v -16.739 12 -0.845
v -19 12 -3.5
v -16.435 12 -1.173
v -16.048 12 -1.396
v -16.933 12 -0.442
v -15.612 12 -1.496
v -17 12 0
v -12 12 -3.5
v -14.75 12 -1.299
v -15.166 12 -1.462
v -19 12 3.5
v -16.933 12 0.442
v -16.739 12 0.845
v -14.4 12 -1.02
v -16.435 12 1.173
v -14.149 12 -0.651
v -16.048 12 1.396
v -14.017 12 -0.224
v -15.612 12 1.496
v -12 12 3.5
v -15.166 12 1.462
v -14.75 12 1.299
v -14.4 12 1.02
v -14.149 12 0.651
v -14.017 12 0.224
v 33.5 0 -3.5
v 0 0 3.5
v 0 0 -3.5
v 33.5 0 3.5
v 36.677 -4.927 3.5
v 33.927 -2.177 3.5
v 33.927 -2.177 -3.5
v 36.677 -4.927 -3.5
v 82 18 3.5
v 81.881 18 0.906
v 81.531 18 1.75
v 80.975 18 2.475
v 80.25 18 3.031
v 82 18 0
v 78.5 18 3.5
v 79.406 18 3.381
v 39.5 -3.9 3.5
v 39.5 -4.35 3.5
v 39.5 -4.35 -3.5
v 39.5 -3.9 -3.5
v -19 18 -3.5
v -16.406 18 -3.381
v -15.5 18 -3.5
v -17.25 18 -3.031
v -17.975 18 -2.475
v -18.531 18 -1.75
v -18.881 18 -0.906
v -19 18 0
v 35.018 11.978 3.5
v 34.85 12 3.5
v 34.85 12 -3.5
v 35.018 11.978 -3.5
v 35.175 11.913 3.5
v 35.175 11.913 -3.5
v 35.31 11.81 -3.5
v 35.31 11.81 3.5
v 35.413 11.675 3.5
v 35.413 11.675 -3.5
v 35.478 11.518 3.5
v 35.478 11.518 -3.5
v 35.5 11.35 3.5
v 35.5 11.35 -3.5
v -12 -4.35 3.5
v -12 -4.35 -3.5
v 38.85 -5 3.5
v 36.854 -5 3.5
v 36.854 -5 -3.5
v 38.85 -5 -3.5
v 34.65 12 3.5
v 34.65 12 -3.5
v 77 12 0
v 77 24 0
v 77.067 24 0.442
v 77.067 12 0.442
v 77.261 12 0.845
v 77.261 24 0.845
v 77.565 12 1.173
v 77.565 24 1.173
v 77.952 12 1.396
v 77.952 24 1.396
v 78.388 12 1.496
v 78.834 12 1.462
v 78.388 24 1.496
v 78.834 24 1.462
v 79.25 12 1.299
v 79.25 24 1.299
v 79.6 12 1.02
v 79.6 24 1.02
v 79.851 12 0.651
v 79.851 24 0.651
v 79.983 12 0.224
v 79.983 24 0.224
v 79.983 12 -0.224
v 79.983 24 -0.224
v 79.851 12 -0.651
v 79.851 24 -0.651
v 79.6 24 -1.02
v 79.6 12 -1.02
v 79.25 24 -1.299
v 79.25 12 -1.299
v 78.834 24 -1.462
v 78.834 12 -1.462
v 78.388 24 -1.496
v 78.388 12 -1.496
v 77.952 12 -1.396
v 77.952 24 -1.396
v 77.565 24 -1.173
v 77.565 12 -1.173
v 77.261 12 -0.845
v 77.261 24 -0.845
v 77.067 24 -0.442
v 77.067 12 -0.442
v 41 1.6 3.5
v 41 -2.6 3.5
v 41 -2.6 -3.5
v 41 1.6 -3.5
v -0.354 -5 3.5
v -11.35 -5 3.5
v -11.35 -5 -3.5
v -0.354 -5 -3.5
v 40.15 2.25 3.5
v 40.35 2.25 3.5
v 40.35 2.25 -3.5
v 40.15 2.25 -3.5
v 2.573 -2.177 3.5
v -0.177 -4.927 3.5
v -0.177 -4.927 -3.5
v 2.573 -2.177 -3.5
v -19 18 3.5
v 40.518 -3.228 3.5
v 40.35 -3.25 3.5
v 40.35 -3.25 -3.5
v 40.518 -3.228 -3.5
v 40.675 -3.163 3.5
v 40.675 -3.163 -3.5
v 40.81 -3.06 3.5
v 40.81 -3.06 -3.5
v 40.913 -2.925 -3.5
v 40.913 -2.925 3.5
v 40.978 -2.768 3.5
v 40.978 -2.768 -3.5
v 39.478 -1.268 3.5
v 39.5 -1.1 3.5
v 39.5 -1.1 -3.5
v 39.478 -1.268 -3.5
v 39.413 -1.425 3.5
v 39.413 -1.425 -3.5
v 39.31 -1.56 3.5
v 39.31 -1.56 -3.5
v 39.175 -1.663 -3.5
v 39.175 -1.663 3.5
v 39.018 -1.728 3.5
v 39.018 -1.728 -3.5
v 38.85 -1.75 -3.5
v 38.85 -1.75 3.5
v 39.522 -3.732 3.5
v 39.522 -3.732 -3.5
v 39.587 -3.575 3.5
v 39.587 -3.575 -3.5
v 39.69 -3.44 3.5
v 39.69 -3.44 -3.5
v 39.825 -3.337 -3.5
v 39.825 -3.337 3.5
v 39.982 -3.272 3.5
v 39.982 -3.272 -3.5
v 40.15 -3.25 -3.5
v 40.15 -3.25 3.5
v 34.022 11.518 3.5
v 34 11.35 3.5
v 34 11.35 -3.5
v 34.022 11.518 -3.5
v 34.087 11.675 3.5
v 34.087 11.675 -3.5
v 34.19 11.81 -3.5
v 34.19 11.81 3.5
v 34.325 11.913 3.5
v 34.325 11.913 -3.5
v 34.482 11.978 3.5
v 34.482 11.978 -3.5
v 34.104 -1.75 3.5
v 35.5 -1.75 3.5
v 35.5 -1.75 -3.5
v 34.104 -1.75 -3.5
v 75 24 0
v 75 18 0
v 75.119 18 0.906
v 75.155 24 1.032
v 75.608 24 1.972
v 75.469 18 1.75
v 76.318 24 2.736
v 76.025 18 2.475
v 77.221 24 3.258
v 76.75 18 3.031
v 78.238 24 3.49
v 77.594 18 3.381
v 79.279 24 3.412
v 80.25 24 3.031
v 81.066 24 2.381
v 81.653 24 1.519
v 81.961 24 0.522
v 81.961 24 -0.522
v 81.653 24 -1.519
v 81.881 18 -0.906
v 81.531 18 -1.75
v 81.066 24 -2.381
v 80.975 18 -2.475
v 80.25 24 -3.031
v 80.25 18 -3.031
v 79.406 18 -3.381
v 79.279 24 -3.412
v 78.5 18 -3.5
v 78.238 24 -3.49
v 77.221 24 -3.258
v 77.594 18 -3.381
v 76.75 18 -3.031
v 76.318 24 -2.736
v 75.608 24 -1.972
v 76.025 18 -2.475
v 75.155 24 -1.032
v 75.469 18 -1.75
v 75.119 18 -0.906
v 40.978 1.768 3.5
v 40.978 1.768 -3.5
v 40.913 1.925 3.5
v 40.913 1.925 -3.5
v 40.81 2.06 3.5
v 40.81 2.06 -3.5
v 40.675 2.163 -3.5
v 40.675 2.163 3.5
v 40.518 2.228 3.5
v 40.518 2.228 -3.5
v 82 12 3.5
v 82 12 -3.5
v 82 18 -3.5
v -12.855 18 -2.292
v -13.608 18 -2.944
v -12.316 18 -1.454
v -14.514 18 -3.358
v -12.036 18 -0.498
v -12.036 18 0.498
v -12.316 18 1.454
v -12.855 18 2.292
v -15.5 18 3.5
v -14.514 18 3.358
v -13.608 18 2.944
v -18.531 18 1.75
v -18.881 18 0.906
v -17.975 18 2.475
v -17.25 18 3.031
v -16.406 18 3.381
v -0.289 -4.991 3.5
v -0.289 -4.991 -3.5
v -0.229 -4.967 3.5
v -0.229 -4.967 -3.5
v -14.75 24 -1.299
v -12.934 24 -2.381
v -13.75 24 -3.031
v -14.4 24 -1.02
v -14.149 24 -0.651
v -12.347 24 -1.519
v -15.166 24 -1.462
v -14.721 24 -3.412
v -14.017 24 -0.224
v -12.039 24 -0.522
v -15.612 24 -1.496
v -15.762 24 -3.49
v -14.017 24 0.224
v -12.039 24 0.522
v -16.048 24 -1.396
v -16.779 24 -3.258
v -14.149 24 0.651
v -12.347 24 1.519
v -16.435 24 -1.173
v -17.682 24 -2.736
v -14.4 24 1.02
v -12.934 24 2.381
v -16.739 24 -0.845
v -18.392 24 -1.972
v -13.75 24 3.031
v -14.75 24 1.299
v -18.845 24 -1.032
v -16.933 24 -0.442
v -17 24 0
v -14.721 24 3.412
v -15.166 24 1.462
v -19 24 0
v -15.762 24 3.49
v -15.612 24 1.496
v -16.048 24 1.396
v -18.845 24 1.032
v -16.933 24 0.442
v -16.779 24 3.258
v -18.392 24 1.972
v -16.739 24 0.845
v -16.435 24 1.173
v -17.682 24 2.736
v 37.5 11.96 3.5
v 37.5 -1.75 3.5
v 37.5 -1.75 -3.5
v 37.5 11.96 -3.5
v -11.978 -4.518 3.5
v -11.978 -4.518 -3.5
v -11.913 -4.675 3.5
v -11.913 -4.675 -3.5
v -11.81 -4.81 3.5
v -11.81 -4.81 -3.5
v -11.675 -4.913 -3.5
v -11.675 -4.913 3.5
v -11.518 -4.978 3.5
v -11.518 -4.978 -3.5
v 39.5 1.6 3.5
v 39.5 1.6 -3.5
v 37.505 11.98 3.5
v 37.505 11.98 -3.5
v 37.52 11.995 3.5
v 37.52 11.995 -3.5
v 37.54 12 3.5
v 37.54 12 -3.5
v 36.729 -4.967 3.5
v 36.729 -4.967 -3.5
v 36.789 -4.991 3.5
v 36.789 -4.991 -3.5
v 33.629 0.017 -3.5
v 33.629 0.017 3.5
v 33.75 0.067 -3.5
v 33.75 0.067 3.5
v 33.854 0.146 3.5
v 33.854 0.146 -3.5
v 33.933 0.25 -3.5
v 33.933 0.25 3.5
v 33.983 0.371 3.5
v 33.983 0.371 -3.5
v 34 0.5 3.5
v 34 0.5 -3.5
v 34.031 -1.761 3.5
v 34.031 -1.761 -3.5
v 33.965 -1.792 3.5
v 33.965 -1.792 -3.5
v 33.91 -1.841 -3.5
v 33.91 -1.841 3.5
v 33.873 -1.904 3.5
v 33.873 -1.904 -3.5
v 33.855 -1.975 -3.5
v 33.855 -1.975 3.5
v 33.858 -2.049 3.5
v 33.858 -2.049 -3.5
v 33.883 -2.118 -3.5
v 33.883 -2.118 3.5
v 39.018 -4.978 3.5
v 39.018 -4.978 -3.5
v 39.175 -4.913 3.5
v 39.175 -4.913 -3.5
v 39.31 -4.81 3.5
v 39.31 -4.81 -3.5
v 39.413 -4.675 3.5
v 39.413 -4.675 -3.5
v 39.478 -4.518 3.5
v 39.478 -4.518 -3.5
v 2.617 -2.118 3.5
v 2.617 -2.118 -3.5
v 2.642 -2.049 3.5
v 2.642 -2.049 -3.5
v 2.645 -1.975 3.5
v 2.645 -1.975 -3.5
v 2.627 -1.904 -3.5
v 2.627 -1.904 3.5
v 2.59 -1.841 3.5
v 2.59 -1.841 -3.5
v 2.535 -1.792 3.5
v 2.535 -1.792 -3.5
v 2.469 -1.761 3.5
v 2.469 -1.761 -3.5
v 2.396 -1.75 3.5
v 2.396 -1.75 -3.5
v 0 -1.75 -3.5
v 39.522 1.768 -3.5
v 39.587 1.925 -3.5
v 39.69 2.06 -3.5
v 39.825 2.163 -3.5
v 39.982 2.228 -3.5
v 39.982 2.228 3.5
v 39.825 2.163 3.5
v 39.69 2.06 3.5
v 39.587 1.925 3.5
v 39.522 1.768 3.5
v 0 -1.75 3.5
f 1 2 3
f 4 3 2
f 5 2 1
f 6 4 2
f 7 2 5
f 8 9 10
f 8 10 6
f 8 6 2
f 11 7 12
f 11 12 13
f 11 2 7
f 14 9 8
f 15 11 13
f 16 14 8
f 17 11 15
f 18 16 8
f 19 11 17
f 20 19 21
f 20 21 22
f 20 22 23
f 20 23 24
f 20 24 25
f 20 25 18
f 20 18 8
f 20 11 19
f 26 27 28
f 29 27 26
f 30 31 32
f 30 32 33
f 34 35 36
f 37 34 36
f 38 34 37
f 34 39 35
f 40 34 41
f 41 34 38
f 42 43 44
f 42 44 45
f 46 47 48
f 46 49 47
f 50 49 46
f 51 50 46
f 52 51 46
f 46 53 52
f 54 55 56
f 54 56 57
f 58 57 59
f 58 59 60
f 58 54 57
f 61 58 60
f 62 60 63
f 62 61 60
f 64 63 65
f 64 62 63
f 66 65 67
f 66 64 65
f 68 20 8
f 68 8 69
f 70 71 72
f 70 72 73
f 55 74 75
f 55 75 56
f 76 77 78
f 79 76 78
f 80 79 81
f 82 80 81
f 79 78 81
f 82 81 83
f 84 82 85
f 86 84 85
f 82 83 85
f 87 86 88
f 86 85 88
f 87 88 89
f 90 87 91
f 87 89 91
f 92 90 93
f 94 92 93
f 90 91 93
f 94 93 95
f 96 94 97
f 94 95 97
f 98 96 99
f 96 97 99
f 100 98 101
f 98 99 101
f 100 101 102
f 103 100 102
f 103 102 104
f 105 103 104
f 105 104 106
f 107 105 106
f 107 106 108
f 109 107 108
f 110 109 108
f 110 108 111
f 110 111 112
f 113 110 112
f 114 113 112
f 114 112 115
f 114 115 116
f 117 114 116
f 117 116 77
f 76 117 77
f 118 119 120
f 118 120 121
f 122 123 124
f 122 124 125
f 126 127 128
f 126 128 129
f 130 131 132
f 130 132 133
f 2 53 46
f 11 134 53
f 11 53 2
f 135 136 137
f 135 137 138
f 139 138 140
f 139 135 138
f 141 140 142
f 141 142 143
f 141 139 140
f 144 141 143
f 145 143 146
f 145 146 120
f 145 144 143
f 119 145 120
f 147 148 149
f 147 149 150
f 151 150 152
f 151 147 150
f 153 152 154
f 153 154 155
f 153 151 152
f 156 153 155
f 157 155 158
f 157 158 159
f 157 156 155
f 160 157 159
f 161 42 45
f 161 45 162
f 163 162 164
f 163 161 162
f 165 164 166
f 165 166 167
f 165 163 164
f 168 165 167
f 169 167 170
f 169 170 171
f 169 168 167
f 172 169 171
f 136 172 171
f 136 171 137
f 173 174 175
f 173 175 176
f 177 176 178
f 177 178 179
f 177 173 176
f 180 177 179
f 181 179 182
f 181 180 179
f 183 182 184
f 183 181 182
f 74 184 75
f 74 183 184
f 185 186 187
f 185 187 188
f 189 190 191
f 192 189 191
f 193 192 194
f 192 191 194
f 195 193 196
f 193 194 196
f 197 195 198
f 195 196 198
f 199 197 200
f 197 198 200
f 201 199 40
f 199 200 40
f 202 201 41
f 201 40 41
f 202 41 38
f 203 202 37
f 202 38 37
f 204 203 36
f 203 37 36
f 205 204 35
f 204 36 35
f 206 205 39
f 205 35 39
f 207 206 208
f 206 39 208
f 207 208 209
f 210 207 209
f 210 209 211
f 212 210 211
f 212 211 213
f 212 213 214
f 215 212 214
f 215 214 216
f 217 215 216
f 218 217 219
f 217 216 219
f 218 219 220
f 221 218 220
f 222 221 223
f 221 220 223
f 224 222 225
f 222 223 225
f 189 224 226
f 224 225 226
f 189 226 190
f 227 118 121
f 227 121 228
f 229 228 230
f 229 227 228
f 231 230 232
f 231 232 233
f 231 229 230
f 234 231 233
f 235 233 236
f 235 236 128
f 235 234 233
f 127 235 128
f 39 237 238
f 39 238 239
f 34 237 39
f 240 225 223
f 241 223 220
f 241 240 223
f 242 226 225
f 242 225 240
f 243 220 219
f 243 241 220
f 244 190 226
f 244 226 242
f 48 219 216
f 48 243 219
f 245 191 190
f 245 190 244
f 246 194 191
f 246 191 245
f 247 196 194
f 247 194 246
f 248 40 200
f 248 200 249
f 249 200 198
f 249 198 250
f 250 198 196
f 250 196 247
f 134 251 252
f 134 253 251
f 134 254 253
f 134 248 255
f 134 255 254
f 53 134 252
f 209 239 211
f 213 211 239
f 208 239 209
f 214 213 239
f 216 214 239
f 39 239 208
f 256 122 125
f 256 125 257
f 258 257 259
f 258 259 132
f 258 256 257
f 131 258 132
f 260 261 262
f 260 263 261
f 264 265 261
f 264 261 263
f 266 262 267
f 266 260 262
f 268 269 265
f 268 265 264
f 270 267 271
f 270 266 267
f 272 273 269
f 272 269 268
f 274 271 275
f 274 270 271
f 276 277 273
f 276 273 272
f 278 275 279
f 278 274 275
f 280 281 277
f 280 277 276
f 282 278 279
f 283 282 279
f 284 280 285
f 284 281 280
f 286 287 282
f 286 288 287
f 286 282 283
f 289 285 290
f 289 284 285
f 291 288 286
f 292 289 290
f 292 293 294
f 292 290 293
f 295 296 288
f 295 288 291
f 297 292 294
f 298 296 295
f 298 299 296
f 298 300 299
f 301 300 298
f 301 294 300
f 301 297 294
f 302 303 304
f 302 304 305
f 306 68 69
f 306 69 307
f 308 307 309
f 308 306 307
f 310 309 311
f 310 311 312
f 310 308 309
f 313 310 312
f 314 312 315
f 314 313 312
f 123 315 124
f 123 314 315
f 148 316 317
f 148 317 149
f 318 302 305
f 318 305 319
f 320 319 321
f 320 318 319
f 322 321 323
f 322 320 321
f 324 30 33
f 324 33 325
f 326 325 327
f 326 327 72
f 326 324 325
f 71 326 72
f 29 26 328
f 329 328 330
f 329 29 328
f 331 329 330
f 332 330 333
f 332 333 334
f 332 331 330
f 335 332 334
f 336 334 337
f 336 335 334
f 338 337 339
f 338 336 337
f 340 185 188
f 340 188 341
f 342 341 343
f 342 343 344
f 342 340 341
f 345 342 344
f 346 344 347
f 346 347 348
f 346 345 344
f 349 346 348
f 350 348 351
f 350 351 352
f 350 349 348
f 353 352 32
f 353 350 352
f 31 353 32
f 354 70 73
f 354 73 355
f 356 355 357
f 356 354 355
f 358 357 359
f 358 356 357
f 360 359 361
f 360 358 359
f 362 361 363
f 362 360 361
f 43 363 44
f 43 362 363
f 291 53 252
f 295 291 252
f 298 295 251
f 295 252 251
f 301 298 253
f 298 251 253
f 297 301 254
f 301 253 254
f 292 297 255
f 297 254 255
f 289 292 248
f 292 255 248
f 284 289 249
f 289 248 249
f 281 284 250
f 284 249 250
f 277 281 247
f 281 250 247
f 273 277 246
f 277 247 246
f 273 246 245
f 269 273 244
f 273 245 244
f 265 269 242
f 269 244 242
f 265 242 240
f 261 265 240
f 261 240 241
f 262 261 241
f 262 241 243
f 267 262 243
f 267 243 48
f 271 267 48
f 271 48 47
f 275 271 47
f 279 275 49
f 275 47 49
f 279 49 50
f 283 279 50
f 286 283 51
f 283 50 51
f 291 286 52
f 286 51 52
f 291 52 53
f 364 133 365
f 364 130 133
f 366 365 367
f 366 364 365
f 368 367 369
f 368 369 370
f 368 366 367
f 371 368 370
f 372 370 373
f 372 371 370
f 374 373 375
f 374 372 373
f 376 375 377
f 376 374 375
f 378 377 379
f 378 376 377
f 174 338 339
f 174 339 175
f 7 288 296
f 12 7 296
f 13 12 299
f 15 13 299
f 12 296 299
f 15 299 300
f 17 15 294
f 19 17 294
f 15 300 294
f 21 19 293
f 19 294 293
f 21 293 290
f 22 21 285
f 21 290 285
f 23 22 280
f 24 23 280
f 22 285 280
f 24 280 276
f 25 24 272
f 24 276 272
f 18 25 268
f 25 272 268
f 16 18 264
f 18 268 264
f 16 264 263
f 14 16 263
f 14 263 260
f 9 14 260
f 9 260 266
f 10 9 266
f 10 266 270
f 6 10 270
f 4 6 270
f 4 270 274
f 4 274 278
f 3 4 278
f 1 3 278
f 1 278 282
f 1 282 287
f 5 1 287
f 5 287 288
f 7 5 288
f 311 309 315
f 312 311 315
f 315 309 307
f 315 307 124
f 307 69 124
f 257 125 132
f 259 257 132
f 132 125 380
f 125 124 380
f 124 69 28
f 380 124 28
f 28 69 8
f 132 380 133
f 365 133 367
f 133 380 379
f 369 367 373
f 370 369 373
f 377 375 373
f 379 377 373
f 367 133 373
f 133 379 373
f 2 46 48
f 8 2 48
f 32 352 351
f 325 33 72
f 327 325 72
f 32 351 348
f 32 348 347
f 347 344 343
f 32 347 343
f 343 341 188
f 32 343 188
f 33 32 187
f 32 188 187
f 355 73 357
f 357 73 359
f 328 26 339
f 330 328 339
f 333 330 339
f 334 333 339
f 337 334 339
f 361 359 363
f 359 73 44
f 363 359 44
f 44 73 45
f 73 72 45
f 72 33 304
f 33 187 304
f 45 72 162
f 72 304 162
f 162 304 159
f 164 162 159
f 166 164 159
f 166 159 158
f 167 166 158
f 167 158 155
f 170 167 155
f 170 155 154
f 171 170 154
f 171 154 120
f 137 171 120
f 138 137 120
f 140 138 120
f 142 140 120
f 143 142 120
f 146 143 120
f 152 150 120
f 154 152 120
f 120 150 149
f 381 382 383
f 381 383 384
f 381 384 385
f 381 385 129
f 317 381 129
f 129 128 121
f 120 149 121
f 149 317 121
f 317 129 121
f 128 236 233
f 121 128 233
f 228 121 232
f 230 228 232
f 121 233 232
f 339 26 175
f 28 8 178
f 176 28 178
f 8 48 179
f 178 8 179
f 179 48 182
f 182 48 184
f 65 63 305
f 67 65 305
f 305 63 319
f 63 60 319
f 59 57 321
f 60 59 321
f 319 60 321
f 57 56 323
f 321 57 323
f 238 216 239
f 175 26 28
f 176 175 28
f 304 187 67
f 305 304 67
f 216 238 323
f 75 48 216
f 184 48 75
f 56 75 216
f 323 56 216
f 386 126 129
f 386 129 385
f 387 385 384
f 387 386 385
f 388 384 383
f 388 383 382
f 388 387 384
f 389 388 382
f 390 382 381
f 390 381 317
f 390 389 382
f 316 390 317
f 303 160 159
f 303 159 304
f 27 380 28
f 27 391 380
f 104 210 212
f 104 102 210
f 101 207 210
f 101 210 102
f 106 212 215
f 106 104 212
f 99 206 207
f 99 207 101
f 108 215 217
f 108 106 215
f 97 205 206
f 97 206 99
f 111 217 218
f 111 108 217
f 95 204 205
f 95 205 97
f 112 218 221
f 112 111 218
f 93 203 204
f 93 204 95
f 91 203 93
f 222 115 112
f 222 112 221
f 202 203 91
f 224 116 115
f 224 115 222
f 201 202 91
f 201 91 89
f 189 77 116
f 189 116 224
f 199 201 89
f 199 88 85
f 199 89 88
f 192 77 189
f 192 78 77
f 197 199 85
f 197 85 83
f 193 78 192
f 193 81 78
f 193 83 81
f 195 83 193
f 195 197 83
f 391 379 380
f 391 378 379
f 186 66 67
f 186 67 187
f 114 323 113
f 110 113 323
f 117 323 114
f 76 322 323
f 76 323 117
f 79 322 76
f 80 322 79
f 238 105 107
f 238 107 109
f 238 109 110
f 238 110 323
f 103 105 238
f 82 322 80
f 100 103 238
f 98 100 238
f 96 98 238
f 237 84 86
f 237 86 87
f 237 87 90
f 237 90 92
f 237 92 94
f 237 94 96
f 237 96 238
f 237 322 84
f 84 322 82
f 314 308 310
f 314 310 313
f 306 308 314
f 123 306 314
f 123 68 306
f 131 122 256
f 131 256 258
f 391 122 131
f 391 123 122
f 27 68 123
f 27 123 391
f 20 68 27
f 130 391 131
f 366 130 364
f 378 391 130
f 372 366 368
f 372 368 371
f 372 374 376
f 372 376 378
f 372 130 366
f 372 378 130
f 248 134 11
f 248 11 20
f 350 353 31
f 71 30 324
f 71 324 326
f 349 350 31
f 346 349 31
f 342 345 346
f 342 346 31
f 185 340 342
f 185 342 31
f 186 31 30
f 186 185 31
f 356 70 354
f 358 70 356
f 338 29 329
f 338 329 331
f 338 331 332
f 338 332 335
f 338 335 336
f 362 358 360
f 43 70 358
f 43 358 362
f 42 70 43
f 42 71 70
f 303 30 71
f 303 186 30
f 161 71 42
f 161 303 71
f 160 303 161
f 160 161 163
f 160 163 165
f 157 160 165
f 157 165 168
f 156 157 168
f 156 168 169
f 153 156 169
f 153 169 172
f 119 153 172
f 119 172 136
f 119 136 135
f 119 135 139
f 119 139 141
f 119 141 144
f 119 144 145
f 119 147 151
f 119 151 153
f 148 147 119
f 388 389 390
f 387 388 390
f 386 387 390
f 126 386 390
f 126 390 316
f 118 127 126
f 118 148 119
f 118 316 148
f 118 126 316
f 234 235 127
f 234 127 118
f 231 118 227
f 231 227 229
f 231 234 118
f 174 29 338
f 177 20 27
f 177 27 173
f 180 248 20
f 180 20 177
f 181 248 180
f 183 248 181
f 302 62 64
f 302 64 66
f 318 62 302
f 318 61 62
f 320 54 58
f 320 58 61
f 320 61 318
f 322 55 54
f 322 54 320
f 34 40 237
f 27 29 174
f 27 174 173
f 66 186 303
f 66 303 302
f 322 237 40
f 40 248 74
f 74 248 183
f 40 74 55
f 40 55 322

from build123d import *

# Parameters (mm, degrees)
F1_DEPTH = 3.5
F2_R     = 3.5
F3_DEPTH = 6
F4_R     = 1.5
F5_DEPTH = 29.001


with BuildPart() as f1:
    # F0 (on Top) → F1 (new body, symmetric)
    with BuildSketch(Plane.XY):
        with BuildLine():
            Line((0, -1.75), (0, 0))
            Line((0, 0), (33.5, 0))
            ThreePointArc((33.5, 0), (33.8535533906, 0.1464466094), (34, 0.5))
            Line((34, 0.5), (34, 11.35))
            ThreePointArc((34, 11.35), (34.1903805922, 11.8096194078), (34.65, 12))
            Line((34.65, 12), (34.85, 12))
            ThreePointArc((34.85, 12), (35.3096194078, 11.8096194078), (35.5, 11.35))
            Line((35.5, 11.35), (35.5, -1.75))
            Line((35.5, -1.75), (34.1035533906, -1.75))
            ThreePointArc((34.1035533906, -1.75), (33.8725835075, -1.9043291419), (33.9267766953, -2.1767766953))
            Line((33.9267766953, -2.1767766953), (36.6767766953, -4.9267766953))
            ThreePointArc((36.6767766953, -4.9267766953), (36.7578825325, -4.9809698831), (36.8535533906, -5))
            Line((36.8535533906, -5), (38.85, -5))
            ThreePointArc((38.85, -5), (39.3096194078, -4.8096194078), (39.5, -4.35))
            Line((39.5, -4.35), (39.5, -3.9))
            ThreePointArc((39.5, -3.9), (39.6903805922, -3.4403805922), (40.15, -3.25))
            Line((40.15, -3.25), (40.35, -3.25))
            ThreePointArc((40.35, -3.25), (40.8096194078, -3.0596194078), (41, -2.6))
            Line((41, -2.6), (41, 1.6))
            ThreePointArc((41, 1.6), (40.8096194078, 2.0596194078), (40.35, 2.25))
            Line((40.35, 2.25), (40.15, 2.25))
            ThreePointArc((40.15, 2.25), (39.6903805922, 2.0596194078), (39.5, 1.6))
            Line((39.5, 1.6), (39.5, -1.1))
            ThreePointArc((39.5, -1.1), (39.3096194078, -1.5596194078), (38.85, -1.75))
            Line((38.85, -1.75), (37.5, -1.75))
            Line((37.5, -1.75), (37.5, 11.96))
            ThreePointArc((37.5, 11.96), (37.5117157288, 11.9882842712), (37.54, 12))
            Line((37.54, 12), (82, 12))
            Line((82, 12), (82, 18))
            Line((82, 18), (-19, 18))
            Line((-19, 18), (-19, 12))
            Line((-19, 12), (-12, 12))
            Line((-12, 12), (-12, -4.35))
            ThreePointArc((-12, -4.35), (-11.8096194078, -4.8096194078), (-11.35, -5))
            Line((-11.35, -5), (-0.3535533906, -5))
            ThreePointArc((-0.3535533906, -5), (-0.2578825325, -4.9809698831), (-0.1767766953, -4.9267766953))
            Line((-0.1767766953, -4.9267766953), (2.5732233047, -2.1767766953))
            ThreePointArc((2.5732233047, -2.1767766953), (2.6274164925, -1.9043291419), (2.3964466094, -1.75))
            Line((2.3964466094, -1.75), (0, -1.75))
        make_face()
    extrude(amount=F1_DEPTH, both=True)

    # F2 (on face) → F3 (join)
    with BuildSketch(Plane(origin=(0, 18, 0), x_dir=(-1, 0, 0), z_dir=(0, 1, 0))):
        with Locations((-78.5, 0)):
            Circle(F2_R)
        with Locations((15.5, 0)):
            Circle(F2_R)
    extrude(amount=F3_DEPTH)

    # F4 (on face) → F5 (cut, through all)
    with BuildSketch(Plane(origin=(0, 24, 0), x_dir=(-1, 0, 0), z_dir=(0, 1, 0))):
        with Locations((-78.5, 0)):
            Circle(F4_R)
        with Locations((15.5, 0)):
            Circle(F4_R)
    extrude(amount=-F5_DEPTH, mode=Mode.SUBTRACT)


solid = f1.part
